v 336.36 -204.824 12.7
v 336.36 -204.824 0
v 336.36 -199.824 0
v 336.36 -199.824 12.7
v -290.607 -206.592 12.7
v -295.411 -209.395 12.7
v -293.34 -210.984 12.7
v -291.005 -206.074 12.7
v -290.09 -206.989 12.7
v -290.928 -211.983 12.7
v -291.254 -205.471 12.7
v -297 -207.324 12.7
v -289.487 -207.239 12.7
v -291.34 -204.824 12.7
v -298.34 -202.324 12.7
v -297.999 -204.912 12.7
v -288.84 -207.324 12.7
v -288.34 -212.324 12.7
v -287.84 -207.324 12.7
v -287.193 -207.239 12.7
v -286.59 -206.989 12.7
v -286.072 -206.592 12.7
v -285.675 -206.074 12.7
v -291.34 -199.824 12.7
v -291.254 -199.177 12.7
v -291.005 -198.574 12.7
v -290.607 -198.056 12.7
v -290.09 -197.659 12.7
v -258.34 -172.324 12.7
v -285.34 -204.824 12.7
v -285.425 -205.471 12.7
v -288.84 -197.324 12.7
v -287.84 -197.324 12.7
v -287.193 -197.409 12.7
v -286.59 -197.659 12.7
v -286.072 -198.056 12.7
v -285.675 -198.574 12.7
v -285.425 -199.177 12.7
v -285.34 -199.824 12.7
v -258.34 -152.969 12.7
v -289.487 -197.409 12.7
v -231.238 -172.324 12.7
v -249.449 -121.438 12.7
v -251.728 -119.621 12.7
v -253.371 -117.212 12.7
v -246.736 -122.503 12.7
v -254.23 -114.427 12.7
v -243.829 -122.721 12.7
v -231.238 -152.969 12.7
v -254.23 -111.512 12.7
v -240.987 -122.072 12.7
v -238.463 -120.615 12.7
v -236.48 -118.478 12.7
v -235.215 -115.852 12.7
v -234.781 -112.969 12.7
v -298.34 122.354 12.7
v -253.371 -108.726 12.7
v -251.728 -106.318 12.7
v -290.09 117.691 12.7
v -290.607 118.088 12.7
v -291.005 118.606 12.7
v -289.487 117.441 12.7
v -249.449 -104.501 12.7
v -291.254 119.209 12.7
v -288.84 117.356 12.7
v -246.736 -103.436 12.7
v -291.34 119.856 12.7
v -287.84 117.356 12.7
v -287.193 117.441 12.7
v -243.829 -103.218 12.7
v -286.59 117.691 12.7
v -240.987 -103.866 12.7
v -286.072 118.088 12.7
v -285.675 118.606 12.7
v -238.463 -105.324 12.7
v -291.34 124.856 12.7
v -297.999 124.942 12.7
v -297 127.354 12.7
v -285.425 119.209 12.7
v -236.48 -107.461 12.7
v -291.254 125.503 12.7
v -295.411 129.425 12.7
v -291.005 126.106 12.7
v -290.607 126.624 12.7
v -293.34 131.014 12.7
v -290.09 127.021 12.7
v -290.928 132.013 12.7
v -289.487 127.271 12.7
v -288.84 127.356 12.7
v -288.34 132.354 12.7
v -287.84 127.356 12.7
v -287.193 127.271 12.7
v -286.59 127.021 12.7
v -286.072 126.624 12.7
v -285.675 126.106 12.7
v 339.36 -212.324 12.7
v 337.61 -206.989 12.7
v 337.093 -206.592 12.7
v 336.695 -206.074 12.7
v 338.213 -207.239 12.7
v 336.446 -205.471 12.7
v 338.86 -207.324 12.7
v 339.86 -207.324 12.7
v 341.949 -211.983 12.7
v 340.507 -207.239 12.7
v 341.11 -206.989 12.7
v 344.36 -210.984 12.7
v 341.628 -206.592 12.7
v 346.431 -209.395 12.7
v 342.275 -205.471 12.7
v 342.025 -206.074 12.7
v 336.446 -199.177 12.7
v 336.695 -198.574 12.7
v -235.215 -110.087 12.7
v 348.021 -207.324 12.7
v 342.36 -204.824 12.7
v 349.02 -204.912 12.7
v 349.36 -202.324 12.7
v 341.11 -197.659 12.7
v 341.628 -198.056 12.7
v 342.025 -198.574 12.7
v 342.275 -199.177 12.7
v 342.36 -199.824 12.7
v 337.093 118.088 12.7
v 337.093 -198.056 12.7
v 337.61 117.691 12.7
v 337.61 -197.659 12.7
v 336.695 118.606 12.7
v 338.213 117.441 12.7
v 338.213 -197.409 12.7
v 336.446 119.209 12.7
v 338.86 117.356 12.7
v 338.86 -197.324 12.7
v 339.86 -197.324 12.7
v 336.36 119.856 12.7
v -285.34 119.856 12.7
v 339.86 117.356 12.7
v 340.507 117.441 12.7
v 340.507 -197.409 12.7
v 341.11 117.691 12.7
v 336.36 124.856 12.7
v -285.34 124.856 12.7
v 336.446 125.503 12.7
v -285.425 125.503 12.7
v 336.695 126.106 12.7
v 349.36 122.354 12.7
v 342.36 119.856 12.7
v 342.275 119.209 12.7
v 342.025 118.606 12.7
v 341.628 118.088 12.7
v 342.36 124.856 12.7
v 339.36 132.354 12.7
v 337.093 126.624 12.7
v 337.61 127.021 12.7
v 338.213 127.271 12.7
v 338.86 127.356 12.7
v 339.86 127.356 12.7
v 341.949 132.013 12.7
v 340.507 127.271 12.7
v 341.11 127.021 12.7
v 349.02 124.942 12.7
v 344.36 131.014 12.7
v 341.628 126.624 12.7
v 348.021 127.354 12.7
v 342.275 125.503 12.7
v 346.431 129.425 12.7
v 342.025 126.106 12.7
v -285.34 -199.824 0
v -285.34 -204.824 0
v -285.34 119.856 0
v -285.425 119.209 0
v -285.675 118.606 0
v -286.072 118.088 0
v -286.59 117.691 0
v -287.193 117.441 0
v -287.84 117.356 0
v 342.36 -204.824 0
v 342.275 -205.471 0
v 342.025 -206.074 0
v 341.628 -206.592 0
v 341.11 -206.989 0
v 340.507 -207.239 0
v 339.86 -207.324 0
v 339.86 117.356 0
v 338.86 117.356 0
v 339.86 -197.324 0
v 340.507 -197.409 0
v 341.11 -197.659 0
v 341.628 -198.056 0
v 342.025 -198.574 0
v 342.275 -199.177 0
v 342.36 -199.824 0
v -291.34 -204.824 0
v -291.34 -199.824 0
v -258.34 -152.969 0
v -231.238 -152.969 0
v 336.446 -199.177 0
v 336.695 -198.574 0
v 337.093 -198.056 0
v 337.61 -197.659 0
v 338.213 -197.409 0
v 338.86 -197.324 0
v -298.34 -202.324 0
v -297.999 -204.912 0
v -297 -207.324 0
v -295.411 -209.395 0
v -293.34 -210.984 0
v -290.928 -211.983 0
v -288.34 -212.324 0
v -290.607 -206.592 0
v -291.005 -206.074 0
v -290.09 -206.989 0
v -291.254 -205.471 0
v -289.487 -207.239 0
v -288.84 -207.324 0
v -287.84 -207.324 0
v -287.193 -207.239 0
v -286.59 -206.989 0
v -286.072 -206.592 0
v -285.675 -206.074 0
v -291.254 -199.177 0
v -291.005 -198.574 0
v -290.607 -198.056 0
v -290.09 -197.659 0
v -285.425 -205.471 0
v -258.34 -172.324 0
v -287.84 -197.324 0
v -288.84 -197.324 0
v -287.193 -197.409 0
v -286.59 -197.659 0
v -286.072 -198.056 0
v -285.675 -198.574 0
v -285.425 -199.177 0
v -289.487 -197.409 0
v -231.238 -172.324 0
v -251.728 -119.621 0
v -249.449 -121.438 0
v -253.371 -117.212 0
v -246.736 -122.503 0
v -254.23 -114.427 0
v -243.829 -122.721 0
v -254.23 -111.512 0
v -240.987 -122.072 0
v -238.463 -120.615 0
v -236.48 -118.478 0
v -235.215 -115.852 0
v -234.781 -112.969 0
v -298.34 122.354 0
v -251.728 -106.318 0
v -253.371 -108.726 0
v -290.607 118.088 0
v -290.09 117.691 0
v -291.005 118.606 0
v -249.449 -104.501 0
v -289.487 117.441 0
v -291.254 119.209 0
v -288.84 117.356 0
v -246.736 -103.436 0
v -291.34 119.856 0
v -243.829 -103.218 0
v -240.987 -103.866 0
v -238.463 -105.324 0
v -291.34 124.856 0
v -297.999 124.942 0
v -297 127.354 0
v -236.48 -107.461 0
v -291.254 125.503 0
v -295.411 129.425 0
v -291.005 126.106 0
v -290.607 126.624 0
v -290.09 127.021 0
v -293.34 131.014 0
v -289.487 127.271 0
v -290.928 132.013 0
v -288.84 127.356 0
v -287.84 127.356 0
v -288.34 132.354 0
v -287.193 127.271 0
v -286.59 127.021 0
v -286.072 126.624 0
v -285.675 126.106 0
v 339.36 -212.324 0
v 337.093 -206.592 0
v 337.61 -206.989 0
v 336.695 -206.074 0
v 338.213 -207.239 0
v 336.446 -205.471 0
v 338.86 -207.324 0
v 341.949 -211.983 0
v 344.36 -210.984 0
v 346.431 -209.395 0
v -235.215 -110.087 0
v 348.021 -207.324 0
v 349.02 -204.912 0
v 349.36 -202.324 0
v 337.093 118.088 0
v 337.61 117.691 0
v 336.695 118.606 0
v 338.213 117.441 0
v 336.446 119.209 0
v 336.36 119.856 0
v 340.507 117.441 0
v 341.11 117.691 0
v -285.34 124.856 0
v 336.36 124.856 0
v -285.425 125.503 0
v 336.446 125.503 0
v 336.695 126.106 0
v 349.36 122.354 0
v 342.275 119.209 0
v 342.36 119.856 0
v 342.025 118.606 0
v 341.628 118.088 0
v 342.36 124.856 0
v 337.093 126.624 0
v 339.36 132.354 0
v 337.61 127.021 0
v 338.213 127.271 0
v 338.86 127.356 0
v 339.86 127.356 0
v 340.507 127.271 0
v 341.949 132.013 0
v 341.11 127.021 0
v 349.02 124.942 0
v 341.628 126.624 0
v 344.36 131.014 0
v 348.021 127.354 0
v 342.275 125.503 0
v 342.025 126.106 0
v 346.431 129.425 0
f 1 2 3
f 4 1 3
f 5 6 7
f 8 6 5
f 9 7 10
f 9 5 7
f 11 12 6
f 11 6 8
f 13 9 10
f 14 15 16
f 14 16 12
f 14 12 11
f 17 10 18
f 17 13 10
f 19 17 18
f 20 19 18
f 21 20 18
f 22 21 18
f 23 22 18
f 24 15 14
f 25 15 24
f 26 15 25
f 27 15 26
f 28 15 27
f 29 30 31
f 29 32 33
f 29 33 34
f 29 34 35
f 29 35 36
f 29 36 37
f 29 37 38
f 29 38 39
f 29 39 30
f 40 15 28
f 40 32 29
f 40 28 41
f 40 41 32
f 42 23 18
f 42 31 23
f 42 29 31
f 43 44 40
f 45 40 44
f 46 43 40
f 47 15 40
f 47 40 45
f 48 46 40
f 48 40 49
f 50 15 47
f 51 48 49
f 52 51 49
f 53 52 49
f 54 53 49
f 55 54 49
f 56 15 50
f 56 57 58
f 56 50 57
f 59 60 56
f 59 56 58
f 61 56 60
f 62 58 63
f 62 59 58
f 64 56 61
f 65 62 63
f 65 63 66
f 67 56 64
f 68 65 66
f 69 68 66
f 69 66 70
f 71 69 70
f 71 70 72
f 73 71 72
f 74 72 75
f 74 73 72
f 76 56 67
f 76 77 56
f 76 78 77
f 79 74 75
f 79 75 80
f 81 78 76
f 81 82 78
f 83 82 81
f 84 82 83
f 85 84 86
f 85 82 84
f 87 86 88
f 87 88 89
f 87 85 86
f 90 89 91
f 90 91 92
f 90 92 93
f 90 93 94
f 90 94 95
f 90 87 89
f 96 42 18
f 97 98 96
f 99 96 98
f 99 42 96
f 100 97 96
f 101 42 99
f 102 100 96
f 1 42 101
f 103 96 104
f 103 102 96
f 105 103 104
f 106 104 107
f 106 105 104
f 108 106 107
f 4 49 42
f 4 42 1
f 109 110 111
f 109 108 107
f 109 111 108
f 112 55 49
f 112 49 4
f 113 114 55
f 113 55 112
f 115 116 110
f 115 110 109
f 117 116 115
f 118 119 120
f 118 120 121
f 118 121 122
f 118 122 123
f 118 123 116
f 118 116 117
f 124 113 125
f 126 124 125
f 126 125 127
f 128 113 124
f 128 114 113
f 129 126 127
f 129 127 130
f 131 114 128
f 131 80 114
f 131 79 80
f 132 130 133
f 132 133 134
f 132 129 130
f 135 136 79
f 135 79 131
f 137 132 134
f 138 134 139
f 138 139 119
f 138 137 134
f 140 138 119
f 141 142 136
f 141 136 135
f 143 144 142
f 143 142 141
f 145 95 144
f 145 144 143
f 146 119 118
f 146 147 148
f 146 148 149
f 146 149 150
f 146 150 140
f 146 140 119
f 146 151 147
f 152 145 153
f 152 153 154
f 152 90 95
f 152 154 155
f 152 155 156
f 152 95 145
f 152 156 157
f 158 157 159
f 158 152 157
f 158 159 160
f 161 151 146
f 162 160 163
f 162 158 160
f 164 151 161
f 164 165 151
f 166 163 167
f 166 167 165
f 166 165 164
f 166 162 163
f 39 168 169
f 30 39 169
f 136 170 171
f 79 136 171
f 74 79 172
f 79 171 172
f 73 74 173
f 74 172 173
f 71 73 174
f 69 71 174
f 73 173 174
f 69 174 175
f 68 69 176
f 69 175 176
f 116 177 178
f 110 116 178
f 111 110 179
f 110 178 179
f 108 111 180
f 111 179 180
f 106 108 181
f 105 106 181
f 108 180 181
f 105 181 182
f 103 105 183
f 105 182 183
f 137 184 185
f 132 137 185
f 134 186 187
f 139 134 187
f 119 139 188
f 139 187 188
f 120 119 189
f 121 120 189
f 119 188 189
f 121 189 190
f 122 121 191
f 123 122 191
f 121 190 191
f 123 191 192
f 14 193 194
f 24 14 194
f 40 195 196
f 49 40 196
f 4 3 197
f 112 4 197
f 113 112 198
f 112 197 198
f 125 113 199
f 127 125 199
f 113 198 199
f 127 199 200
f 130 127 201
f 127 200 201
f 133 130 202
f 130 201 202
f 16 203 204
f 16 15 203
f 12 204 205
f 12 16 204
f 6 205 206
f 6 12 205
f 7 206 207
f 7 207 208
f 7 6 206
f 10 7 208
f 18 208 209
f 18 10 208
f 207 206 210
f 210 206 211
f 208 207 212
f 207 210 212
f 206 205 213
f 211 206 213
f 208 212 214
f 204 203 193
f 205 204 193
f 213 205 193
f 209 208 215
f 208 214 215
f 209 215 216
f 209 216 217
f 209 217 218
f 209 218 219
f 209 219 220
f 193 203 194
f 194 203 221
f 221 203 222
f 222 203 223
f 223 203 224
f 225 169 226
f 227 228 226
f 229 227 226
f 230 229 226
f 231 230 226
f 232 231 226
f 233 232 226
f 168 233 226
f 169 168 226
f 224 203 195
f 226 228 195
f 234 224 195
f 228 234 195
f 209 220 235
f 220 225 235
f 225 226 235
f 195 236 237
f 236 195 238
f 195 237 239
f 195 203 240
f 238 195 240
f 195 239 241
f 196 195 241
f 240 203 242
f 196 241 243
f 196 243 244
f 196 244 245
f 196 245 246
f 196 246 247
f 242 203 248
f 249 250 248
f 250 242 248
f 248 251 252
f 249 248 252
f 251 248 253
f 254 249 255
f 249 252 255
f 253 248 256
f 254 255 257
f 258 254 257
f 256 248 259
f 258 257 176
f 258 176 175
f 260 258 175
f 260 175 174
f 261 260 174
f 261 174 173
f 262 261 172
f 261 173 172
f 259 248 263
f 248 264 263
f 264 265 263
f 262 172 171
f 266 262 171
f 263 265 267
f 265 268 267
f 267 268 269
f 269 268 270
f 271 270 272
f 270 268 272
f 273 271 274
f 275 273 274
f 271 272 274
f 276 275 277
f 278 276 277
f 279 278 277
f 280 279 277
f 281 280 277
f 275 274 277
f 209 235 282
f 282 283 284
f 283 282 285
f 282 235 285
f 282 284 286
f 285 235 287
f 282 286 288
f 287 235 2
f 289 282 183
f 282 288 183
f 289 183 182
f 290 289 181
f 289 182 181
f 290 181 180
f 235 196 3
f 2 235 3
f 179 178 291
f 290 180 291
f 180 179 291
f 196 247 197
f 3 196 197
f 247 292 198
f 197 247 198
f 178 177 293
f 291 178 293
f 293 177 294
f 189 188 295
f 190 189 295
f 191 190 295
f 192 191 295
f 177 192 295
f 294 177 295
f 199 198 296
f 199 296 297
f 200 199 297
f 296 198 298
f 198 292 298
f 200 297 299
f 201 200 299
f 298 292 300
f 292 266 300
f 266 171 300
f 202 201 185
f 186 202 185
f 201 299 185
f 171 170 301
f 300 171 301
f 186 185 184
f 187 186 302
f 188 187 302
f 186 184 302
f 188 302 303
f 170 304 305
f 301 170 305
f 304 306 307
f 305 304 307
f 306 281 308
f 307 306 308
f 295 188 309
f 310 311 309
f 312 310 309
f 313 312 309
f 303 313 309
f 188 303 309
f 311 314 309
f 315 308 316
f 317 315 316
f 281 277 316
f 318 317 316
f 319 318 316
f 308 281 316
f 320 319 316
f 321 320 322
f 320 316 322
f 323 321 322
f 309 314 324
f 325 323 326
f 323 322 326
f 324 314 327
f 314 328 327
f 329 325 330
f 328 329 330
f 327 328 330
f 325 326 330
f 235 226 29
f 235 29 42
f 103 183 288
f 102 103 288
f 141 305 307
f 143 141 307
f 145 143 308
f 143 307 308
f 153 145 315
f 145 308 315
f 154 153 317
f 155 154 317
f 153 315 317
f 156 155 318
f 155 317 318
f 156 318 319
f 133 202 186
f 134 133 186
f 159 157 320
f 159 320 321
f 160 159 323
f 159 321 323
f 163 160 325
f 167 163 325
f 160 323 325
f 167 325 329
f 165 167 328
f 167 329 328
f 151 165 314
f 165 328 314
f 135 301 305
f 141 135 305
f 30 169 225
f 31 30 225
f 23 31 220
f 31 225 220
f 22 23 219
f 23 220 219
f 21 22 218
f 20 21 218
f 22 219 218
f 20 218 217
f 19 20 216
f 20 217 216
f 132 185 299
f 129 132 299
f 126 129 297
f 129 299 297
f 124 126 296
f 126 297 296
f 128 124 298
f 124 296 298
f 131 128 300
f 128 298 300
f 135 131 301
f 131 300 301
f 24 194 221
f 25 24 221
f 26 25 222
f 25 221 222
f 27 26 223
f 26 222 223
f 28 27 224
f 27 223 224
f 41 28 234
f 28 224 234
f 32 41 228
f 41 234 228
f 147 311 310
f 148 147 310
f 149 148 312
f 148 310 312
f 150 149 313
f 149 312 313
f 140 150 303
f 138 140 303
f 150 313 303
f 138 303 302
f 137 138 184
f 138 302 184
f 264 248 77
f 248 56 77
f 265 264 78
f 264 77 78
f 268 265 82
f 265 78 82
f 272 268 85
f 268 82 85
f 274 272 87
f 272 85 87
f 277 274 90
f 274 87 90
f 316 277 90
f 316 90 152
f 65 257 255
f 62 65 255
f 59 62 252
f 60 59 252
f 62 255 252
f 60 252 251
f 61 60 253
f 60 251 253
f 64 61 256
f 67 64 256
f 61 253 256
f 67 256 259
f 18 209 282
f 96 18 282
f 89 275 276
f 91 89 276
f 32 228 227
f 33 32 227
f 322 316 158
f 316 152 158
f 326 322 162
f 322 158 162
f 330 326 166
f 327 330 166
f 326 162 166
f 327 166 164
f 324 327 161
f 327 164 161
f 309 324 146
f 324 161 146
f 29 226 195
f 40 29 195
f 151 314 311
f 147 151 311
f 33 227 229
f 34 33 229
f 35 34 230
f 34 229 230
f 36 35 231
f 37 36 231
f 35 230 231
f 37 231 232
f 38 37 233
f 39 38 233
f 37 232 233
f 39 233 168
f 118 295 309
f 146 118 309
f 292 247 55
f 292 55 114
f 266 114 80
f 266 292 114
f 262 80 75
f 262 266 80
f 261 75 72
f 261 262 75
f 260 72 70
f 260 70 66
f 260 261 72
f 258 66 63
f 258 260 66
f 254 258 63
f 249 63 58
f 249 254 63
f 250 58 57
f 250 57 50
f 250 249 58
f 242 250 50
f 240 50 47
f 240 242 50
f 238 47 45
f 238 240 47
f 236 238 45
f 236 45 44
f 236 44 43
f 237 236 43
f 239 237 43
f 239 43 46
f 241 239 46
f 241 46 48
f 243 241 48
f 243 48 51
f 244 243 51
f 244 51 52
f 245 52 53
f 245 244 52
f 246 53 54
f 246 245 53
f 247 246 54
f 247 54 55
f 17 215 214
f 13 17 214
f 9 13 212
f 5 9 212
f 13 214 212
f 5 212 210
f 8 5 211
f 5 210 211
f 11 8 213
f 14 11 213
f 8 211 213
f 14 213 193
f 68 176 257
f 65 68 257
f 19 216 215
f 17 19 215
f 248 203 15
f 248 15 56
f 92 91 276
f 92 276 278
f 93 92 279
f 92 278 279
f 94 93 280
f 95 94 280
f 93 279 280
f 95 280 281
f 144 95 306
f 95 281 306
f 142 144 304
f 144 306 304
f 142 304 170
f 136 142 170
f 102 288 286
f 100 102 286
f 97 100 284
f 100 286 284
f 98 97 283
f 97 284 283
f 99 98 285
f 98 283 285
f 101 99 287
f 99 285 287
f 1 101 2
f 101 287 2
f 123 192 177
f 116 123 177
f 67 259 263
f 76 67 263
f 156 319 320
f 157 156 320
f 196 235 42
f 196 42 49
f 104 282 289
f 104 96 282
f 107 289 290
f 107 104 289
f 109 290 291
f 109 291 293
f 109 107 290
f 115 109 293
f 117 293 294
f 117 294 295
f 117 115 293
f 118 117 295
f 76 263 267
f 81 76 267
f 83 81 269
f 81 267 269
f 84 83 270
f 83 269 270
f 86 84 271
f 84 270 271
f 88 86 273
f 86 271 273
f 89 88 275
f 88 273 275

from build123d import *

# Parameters (mm, degrees)
SKETCH1_W           = 647.7
SKETCH1_H           = 344.678
SKETCH1_R           = 9.779
SKETCH1_W_2         = 27.1018
SKETCH1_H_2         = 19.3548
BOSS_EXTRUDE1_DEPTH = 12.7
FILLET1_R           = 10
FILLET2_R           = 10


with BuildPart() as part:
    # Sketch1 → Boss-Extrude1 (new body)
    with BuildSketch(Plane.XY):
        with Locations((25.51036036, -39.985171171)):
            Rectangle(SKETCH1_W, SKETCH1_H)
        with Locations((-244.559967776, -112.969371171)):
            Circle(SKETCH1_R, mode=Mode.SUBTRACT)
        with BuildLine():
            Line((339.86036036, -207.324171171), (338.86036036, -207.324171171))
            ThreePointArc((338.86036036, -207.324171171), (337.092593407, -206.591938124), (336.36036036, -204.824171171))
            Line((336.36036036, -204.824171171), (336.36036036, -199.824171171))
            ThreePointArc((336.36036036, -199.824171171), (337.092593407, -198.056404218), (338.86036036, -197.324171171))
            Line((338.86036036, -197.324171171), (339.86036036, -197.324171171))
            ThreePointArc((339.86036036, -197.324171171), (341.628127313, -198.056404218), (342.36036036, -199.824171171))
            Line((342.36036036, -199.824171171), (342.36036036, -204.824171171))
            ThreePointArc((342.36036036, -204.824171171), (341.628127313, -206.591938124), (339.86036036, -207.324171171))
        make_face(mode=Mode.SUBTRACT)
        with BuildLine():
            Line((-287.83963964, -207.324171171), (-288.83963964, -207.324171171))
            ThreePointArc((-288.83963964, -207.324171171), (-290.607406593, -206.591938124), (-291.33963964, -204.824171171))
            Line((-291.33963964, -204.824171171), (-291.33963964, -199.824171171))
            ThreePointArc((-291.33963964, -199.824171171), (-290.607406593, -198.056404218), (-288.83963964, -197.324171171))
            Line((-288.83963964, -197.324171171), (-287.83963964, -197.324171171))
            ThreePointArc((-287.83963964, -197.324171171), (-286.071872687, -198.056404218), (-285.33963964, -199.824171171))
            Line((-285.33963964, -199.824171171), (-285.33963964, -204.824171171))
            ThreePointArc((-285.33963964, -204.824171171), (-286.071872687, -206.591938124), (-287.83963964, -207.324171171))
        make_face(mode=Mode.SUBTRACT)
        with BuildLine():
            Line((-287.83963964, 117.355828829), (-288.83963964, 117.355828829))
            ThreePointArc((-288.83963964, 117.355828829), (-290.607406593, 118.088061876), (-291.33963964, 119.855828829))
            Line((-291.33963964, 119.855828829), (-291.33963964, 124.855828829))
            ThreePointArc((-291.33963964, 124.855828829), (-290.607406593, 126.623595782), (-288.83963964, 127.355828829))
            Line((-288.83963964, 127.355828829), (-287.83963964, 127.355828829))
            ThreePointArc((-287.83963964, 127.355828829), (-286.071872687, 126.623595782), (-285.33963964, 124.855828829))
            Line((-285.33963964, 124.855828829), (-285.33963964, 119.855828829))
            ThreePointArc((-285.33963964, 119.855828829), (-286.071872687, 118.088061876), (-287.83963964, 117.355828829))
        make_face(mode=Mode.SUBTRACT)
        with BuildLine():
            Line((339.86036036, 117.355828829), (338.86036036, 117.355828829))
            ThreePointArc((338.86036036, 117.355828829), (337.092593407, 118.088061876), (336.36036036, 119.855828829))
            Line((336.36036036, 119.855828829), (336.36036036, 124.855828829))
            ThreePointArc((336.36036036, 124.855828829), (337.092593407, 126.623595782), (338.86036036, 127.355828829))
            Line((338.86036036, 127.355828829), (339.86036036, 127.355828829))
            ThreePointArc((339.86036036, 127.355828829), (341.628127313, 126.623595782), (342.36036036, 124.855828829))
            Line((342.36036036, 124.855828829), (342.36036036, 119.855828829))
            ThreePointArc((342.36036036, 119.855828829), (341.628127313, 118.088061876), (339.86036036, 117.355828829))
        make_face(mode=Mode.SUBTRACT)
        with Locations((-244.78873964, -162.646771171)):
            Rectangle(SKETCH1_W_2, SKETCH1_H_2, mode=Mode.SUBTRACT)
    extrude(amount=BOSS_EXTRUDE1_DEPTH)

    # Fillet1
    fillet1_edges = [part.edges().sort_by_distance(p)[0] for p in [
        (-298.33963964, 132.353828829, 6.35),
        (349.36036036, 132.353828829, 6.35),
        (349.36036036, -212.324171171, 6.35),
    ]]
    fillet(fillet1_edges, radius=FILLET1_R)

    # Fillet2
    fillet2_edges = [part.edges().sort_by_distance(p)[0] for p in [
        (-298.33963964, -212.324171171, 6.35),
    ]]
    fillet(fillet2_edges, radius=FILLET2_R)


solid = part.part
